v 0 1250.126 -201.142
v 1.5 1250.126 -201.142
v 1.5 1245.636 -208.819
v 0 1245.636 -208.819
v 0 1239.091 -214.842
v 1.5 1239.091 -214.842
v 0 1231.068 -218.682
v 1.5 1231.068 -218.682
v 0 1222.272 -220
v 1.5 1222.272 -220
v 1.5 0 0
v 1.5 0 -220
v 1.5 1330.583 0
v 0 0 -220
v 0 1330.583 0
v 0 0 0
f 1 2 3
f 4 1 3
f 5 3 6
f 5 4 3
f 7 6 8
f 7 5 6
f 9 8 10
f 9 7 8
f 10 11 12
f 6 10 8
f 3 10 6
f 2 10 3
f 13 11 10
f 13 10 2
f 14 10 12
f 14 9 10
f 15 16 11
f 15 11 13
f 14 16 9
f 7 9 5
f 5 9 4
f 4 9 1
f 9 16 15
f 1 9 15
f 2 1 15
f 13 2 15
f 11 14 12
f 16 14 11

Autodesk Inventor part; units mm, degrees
ref_plane "YZ Plane" through (0, 0, 0) normal (1, 0, 0) x (0, 1, 0)
ref_plane "XZ Plane" through (0, 0, 0) normal (0, 1, 0) x (-1, 0, 0)
ref_plane "XY Plane" through (0, 0, 0) normal (0, 0, 1) x (1, 0, 0)
sketch "Sketch1" plane through (0, 0, 0) normal (1, 0, 0) x (0, 1, 0)
  line L0 (1250.1265, -201.1417) -> (1330.5832, 0)
  line L1 (0, 0) -> (1330.5832, 0)
  line L2 (0, -220) -> (0, 0)
  line L3 (1222.2722, -220) -> (0, -220)
  arc A0 (1222.2722, -220) -> (1250.1265, -201.1417) centre (1222.2722, -190) ccw
extrude "Extrusion1" add sketch "Sketch1" along normal blind 1.5
properties part number "CARCASA_ALUM_2_FLAT" material "Steel, Mild, Welded"
